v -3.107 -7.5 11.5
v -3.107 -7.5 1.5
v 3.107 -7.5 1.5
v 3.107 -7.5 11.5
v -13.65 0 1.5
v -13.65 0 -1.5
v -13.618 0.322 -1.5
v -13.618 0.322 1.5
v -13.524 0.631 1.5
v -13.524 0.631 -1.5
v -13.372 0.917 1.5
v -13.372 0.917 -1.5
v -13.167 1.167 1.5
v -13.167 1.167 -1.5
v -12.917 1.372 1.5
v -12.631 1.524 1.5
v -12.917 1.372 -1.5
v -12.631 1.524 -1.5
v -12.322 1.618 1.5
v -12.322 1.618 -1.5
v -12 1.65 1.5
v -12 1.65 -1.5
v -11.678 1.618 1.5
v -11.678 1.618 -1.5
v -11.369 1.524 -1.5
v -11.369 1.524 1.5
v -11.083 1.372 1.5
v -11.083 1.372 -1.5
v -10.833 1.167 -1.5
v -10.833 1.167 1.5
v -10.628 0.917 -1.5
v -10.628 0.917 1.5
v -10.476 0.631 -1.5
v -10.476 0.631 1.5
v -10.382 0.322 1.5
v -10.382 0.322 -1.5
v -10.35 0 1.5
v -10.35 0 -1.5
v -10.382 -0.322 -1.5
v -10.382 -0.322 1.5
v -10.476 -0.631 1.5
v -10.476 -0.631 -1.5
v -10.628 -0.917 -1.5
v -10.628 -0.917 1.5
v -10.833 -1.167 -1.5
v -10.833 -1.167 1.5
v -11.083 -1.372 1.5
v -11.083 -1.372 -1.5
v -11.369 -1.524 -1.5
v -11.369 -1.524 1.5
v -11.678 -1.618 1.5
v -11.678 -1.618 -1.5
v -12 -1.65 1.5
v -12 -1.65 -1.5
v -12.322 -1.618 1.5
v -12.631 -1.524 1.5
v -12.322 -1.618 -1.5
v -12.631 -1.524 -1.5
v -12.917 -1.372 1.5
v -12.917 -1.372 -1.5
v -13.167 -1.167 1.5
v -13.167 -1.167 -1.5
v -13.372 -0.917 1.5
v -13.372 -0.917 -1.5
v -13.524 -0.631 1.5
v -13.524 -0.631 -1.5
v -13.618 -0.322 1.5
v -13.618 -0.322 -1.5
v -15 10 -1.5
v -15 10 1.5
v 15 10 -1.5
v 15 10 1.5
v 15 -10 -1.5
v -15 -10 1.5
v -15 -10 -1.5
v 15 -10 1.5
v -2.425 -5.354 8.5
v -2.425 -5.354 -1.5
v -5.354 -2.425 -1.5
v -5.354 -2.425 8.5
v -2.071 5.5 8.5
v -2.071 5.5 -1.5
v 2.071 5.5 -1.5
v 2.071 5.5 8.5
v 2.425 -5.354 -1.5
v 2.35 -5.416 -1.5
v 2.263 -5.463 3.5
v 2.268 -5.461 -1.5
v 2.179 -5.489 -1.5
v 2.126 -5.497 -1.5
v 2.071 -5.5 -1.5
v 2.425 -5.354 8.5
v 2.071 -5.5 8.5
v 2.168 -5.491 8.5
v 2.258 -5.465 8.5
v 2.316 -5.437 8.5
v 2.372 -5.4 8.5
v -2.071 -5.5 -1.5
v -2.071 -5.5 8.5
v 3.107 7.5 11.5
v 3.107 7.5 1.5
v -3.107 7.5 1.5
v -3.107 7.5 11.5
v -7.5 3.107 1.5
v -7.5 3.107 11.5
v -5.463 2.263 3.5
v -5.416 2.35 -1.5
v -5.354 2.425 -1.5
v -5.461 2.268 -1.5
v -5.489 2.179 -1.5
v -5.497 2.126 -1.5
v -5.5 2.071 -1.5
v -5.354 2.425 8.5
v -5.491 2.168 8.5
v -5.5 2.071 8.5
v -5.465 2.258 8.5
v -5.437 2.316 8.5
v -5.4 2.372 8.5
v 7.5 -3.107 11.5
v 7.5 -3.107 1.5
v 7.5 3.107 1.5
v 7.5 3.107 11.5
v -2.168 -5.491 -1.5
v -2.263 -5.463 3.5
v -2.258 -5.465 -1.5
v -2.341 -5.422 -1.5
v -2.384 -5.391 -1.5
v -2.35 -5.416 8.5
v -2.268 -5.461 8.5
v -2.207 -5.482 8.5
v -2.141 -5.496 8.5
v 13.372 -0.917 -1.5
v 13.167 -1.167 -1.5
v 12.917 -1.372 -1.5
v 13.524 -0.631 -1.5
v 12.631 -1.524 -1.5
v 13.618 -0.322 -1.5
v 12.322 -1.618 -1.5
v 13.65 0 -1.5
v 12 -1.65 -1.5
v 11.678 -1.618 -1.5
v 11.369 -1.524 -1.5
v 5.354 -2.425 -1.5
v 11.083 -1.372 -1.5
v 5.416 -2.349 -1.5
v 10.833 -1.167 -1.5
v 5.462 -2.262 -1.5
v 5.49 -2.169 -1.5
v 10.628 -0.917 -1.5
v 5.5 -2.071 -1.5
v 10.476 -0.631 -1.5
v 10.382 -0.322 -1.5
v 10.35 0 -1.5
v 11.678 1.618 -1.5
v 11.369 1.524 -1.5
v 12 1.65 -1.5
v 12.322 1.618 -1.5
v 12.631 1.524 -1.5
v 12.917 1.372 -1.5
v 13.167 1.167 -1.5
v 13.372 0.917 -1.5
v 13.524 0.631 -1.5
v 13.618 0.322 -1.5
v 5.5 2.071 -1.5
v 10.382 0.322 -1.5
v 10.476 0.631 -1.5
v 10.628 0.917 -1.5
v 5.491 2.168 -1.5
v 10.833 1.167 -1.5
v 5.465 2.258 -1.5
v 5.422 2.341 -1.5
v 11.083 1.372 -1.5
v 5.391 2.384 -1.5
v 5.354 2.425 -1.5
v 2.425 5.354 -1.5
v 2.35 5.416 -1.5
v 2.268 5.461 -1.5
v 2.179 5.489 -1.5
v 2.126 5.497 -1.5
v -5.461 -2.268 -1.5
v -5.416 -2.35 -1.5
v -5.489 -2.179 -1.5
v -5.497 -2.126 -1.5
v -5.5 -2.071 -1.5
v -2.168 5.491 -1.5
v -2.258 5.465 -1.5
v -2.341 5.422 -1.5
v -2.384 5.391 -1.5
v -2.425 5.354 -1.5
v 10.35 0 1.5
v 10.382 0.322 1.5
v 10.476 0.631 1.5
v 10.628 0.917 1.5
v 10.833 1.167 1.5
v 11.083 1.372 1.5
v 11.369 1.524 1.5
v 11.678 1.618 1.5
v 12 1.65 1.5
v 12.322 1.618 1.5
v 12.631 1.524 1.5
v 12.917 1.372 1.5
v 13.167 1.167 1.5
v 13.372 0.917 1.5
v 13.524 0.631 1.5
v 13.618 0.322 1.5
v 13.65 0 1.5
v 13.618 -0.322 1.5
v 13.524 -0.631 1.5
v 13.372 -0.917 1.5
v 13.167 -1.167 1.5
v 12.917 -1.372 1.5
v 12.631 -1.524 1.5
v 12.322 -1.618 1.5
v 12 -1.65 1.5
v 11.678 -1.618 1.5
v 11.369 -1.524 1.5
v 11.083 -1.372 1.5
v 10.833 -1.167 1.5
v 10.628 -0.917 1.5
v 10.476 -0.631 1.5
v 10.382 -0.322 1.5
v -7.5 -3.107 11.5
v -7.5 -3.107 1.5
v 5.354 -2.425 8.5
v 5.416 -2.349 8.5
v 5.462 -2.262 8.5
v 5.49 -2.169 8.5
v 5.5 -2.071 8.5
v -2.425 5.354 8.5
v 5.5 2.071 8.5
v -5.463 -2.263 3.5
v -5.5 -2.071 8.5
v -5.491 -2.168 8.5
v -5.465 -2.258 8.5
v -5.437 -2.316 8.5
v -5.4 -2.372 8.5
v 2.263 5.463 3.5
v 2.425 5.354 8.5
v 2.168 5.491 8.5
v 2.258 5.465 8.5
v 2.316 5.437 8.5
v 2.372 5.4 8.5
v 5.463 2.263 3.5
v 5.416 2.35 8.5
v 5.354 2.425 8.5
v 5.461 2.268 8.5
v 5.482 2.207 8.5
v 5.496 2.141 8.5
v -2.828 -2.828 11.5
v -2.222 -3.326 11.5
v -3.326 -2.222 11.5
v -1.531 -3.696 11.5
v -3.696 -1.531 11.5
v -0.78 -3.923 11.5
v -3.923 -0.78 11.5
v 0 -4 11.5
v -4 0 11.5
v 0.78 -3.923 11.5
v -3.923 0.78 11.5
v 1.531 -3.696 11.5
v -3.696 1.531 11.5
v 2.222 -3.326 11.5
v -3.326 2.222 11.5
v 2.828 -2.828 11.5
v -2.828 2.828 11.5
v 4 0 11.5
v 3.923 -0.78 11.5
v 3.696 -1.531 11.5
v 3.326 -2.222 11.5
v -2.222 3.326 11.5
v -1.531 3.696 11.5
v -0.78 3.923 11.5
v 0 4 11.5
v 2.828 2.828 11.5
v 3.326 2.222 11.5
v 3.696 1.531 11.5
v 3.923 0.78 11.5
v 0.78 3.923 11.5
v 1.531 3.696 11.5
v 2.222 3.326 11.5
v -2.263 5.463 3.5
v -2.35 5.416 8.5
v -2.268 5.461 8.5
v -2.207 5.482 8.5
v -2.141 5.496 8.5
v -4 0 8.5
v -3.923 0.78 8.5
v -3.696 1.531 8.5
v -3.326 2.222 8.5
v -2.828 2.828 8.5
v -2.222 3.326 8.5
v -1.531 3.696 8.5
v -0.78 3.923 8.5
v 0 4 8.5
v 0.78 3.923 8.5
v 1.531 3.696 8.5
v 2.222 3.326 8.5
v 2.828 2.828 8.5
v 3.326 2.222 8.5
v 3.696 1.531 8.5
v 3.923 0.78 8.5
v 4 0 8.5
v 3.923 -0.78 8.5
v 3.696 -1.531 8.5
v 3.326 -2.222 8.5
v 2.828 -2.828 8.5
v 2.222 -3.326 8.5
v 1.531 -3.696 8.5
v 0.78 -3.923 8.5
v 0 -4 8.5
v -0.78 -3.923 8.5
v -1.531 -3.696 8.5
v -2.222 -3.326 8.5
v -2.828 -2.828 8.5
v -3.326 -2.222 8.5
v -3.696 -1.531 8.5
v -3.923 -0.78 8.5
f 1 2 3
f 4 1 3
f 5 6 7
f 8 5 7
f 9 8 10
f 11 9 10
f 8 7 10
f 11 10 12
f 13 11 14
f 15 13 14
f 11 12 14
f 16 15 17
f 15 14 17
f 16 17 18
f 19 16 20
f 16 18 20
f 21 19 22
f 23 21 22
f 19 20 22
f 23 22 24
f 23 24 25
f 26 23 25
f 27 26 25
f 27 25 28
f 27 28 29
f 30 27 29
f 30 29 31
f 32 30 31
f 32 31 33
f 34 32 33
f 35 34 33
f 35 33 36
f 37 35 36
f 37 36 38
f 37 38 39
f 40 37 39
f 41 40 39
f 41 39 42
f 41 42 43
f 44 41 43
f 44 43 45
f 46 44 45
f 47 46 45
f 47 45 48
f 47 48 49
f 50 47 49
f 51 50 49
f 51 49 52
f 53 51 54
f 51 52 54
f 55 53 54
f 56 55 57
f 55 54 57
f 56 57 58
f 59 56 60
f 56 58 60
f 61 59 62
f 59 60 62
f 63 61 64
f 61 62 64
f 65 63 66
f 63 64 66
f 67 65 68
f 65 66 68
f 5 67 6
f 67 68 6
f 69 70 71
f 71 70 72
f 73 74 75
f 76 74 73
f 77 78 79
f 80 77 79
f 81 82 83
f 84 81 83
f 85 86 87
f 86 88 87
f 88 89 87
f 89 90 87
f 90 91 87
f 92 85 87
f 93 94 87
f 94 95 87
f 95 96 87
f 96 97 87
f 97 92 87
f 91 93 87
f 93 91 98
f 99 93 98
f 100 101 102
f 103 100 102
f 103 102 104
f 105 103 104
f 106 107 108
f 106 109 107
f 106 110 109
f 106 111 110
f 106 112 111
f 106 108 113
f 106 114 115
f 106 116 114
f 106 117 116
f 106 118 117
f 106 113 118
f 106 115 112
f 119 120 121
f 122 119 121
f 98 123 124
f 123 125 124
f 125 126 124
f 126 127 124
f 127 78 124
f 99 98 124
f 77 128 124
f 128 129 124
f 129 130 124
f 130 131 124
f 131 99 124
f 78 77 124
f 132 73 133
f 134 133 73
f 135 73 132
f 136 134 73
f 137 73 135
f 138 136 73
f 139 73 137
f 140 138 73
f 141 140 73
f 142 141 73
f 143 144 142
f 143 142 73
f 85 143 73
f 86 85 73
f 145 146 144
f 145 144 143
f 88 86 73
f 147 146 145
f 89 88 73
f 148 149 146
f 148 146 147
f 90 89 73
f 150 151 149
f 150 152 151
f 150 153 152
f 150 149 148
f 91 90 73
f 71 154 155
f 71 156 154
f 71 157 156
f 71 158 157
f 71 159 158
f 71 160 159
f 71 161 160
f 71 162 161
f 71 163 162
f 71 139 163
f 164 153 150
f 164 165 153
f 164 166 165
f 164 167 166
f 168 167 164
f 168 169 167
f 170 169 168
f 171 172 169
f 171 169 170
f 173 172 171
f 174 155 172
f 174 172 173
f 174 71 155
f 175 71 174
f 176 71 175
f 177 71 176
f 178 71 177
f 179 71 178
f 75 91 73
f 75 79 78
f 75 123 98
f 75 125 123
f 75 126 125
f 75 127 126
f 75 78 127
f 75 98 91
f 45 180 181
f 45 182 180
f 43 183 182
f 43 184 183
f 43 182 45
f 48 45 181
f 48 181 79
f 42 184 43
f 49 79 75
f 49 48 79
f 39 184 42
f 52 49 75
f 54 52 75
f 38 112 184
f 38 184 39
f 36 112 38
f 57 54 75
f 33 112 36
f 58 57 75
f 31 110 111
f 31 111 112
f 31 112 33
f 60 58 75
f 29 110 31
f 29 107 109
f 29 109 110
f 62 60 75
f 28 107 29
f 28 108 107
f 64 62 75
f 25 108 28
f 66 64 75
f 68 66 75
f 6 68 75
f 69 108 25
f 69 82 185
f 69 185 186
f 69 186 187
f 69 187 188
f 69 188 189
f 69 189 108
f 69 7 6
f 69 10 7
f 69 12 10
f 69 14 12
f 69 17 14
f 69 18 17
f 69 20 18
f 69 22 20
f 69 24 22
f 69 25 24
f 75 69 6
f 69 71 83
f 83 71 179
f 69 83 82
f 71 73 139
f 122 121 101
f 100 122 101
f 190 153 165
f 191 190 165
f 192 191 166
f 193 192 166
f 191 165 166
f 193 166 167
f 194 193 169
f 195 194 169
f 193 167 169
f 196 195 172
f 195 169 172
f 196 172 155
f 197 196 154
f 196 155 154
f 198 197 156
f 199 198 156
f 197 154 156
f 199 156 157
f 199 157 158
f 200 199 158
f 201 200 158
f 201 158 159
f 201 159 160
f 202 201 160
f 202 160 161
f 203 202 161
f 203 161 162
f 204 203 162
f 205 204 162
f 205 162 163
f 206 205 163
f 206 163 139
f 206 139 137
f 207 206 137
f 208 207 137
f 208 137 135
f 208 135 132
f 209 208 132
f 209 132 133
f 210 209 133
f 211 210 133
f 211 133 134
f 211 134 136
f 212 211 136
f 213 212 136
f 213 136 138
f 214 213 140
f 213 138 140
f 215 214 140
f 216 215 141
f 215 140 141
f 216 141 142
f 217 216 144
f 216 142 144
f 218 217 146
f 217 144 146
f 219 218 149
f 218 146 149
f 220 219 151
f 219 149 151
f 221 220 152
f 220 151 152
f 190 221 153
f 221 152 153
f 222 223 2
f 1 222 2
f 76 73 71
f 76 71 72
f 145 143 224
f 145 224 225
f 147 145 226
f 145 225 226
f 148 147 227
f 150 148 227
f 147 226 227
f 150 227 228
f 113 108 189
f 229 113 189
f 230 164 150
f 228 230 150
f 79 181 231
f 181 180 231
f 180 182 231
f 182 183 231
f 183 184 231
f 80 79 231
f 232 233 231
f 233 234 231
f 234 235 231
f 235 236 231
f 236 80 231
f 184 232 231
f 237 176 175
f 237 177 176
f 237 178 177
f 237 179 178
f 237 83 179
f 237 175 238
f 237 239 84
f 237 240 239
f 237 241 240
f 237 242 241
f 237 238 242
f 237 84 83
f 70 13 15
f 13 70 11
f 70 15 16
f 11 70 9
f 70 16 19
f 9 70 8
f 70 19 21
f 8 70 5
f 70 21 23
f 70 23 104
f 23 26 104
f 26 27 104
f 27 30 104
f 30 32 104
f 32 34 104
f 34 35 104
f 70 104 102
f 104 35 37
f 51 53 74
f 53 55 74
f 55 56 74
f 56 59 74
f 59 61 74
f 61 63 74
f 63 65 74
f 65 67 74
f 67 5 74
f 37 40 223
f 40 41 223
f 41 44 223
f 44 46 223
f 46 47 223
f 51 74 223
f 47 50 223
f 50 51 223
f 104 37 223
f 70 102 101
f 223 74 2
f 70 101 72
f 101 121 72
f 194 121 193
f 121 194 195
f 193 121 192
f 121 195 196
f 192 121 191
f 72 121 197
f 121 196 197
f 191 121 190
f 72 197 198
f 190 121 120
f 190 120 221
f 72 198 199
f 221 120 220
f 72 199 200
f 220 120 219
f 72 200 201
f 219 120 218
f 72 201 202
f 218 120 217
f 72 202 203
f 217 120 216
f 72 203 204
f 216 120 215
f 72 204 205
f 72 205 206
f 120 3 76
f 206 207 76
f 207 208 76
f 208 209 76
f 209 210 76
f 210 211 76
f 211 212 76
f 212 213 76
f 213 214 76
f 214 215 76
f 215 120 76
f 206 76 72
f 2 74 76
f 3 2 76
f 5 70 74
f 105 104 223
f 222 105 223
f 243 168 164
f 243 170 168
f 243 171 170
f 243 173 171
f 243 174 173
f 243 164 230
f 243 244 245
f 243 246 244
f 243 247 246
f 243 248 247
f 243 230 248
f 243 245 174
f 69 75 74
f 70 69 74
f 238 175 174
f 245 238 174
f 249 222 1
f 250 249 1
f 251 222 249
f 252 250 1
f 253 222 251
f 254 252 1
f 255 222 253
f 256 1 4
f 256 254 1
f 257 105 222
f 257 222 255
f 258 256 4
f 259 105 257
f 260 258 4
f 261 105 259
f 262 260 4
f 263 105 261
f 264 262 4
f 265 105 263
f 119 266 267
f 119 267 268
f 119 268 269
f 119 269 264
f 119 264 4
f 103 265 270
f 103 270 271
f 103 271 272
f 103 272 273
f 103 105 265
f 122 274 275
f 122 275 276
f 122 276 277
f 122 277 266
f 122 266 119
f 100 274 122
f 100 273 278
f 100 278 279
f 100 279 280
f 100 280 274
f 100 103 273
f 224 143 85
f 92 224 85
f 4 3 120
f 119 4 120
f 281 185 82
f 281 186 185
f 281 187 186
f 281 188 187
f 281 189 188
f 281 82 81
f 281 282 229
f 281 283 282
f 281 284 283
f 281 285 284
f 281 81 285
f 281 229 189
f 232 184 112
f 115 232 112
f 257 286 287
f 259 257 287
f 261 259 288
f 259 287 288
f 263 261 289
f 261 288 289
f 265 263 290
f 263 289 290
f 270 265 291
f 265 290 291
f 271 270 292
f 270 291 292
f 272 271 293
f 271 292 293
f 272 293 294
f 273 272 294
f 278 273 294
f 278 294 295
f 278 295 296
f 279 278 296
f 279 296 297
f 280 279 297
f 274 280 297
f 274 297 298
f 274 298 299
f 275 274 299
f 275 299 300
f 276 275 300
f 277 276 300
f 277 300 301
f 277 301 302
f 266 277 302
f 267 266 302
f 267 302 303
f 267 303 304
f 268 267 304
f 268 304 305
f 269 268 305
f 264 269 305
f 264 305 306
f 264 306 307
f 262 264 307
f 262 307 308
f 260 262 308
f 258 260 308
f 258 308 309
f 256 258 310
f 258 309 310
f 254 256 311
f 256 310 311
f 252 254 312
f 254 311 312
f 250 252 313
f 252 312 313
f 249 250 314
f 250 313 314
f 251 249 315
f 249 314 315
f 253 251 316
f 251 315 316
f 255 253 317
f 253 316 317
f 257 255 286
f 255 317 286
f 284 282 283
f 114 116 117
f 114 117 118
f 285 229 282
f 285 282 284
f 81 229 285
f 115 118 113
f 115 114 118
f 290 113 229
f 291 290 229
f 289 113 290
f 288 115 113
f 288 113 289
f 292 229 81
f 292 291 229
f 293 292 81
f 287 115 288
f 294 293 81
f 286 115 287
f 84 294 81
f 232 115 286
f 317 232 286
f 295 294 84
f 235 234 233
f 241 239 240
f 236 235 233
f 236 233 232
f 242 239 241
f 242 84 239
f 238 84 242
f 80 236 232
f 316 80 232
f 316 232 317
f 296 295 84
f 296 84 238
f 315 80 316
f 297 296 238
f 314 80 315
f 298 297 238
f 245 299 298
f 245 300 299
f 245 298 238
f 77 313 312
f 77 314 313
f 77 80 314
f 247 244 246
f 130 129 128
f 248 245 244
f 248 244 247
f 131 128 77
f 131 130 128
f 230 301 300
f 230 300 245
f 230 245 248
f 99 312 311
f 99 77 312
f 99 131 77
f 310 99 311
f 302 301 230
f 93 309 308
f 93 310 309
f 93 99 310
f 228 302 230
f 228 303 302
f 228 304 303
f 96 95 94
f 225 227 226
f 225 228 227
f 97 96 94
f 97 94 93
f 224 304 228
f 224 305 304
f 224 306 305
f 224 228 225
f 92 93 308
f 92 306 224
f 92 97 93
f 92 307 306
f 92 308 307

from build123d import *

# Parameters (mm, degrees)
F0_W         = 30
F0_H         = 3
F1_DEPTH     = 10
F3_DEPTH     = 10
F5_DEPTH     = 10
F7_D         = 8
F8_T1_DEPTH  = 10.517766953
F9_R         = 0.5
F10_T1_DEPTH = 10.517766953
F11_T1_DEPTH = 10.517766953
F12_T1_DEPTH = 10.517766953
F13_T1_DEPTH = 10.517766953
F14_T1_DEPTH = 10.517766953
F15_T1_DEPTH = 10.517766953
F17_D        = 3.3


# Not quite as in the source:
# - a fillet or chamfer that OpenCascade refuses, or shapes differently, is made with other operations: its cross-section is extruded or revolved along the edge and cut away or added
# - a feature names something its author has since deleted; it is built from what else it names


with BuildPart() as f1:
    # F0 (on Front) → F1 (new body, symmetric)
    with BuildSketch(Plane.XZ):
        Rectangle(F0_W, F0_H)
    extrude(amount=F1_DEPTH, both=True)

    # F2 (on face) → F3 (join)
    with BuildSketch(Plane.XY.offset(1.5)):
        Polygon((-3.1066017178, -7.5), (3.1066017178, -7.5), (7.5, -3.1066017178), (7.5, 3.1066017178), (3.1066017178, 7.5), (-3.1066017178, 7.5), (-7.5, 3.1066017178), (-7.5, -3.1066017178), align=None)
    extrude(amount=F3_DEPTH)

    # F4 (on face) → F5 (cut)
    with BuildSketch(Plane(origin=(0, 0, -1.5), x_dir=(1, 0, 0), z_dir=(0, 0, -1))):
        Polygon((-2.2781745931, -5.5), (2.2781745931, -5.5), (5.5, -2.2781745931), (5.5, 2.2781745931), (2.2781745931, 5.5), (-2.2781745931, 5.5), (-5.5, 2.2781745931), (-5.5, -2.2781745931), align=None)
    extrude(amount=-F5_DEPTH, mode=Mode.SUBTRACT)

    # F7 (through all)
    with Locations(Plane.XY.offset(11.5)):
        with Locations((0, 0)):
            Hole(F7_D / 2)

    # F8: fillet of radius 0.5 on 1 edges, made by hand

    # F8_s2 → F8_t1 (join)
    with BuildSketch(Plane.XY.offset(-1.5)):
        with BuildLine():
            add(Edge.make_bspline(
                [(2.4246212025, -5.3535533906), (2.2781745931, -5.5), (2.0710678119, -5.5)],
                knots=[0, 0, 0, 1, 1, 1], degree=2, weights=[1, 1, 1]))
            Line((2.0710678119, -5.5), (2.2781745931, -5.5))
            Line((2.2781745931, -5.5), (2.4246212025, -5.3535533906))
        make_face()
    extrude(amount=F8_T1_DEPTH)

    # F9
    f9_edges = [f1.edges().sort_by_distance(p)[0] for p in [
        (5.5, -2.278175, 3.5),
    ]]
    fillet(f9_edges, radius=F9_R)

    # F10: fillet of radius 0.5 on 1 edges, made by hand

    # F10_s2 → F10_t1 (join)
    with BuildSketch(Plane.XY.offset(-1.5)):
        with BuildLine():
            add(Edge.make_bspline(
                [(-2.0710678119, -5.5), (-2.2781745931, -5.5), (-2.4246212025, -5.3535533906)],
                knots=[0, 0, 0, 1, 1, 1], degree=2, weights=[1, 1, 1]))
            Line((-2.4246212025, -5.3535533906), (-2.2781745931, -5.5))
            Line((-2.2781745931, -5.5), (-2.0710678119, -5.5))
        make_face()
    extrude(amount=F10_T1_DEPTH)

    # F11: fillet of radius 0.5 on 1 edges, made by hand

    # F11_s2 → F11_t1 (join)
    with BuildSketch(Plane.XY.offset(-1.5)):
        with BuildLine():
            add(Edge.make_bspline(
                [(-5.3535533906, -2.4246212025), (-5.5, -2.2781745931), (-5.5, -2.0710678119)],
                knots=[0, 0, 0, 1, 1, 1], degree=2, weights=[1, 1, 1]))
            Line((-5.5, -2.0710678119), (-5.5, -2.2781745931))
            Line((-5.5, -2.2781745931), (-5.3535533906, -2.4246212025))
        make_face()
    extrude(amount=F11_T1_DEPTH)

    # F12: fillet of radius 0.5 on 1 edges, made by hand

    # F12_s2 → F12_t1 (join)
    with BuildSketch(Plane.XY.offset(-1.5)):
        with BuildLine():
            add(Edge.make_bspline(
                [(-5.3535533906, 2.4246212025), (-5.5, 2.2781745931), (-5.5, 2.0710678119)],
                knots=[0, 0, 0, 1, 1, 1], degree=2, weights=[1, 1, 1]))
            Line((-5.5, 2.0710678119), (-5.5, 2.2781745931))
            Line((-5.5, 2.2781745931), (-5.3535533906, 2.4246212025))
        make_face()
    extrude(amount=F12_T1_DEPTH)

    # F13: fillet of radius 0.5 on 1 edges, made by hand

    # F13_s2 → F13_t1 (join)
    with BuildSketch(Plane.XY.offset(-1.5)):
        with BuildLine():
            add(Edge.make_bspline(
                [(5.5, 2.0710678119), (5.5, 2.2781745931), (5.3535533906, 2.4246212025)],
                knots=[0, 0, 0, 1, 1, 1], degree=2, weights=[1, 1, 1]))
            Line((5.3535533906, 2.4246212025), (5.5, 2.2781745931))
            Line((5.5, 2.2781745931), (5.5, 2.0710678119))
        make_face()
    extrude(amount=F13_T1_DEPTH)

    # F14: fillet of radius 0.5 on 1 edges, made by hand

    # F14_s2 → F14_t1 (join)
    with BuildSketch(Plane.XY.offset(-1.5)):
        with BuildLine():
            add(Edge.make_bspline(
                [(2.4246212025, 5.3535533906), (2.2781745931, 5.5), (2.0710678119, 5.5)],
                knots=[0, 0, 0, 1, 1, 1], degree=2, weights=[1, 1, 1]))
            Line((2.0710678119, 5.5), (2.2781745931, 5.5))
            Line((2.2781745931, 5.5), (2.4246212025, 5.3535533906))
        make_face()
    extrude(amount=F14_T1_DEPTH)

    # F15: fillet of radius 0.5 on 1 edges, made by hand

    # F15_s2 → F15_t1 (join)
    with BuildSketch(Plane.XY.offset(-1.5)):
        with BuildLine():
            add(Edge.make_bspline(
                [(-2.0710678119, 5.5), (-2.2781745931, 5.5), (-2.4246212025, 5.3535533906)],
                knots=[0, 0, 0, 1, 1, 1], degree=2, weights=[1, 1, 1]))
            Line((-2.4246212025, 5.3535533906), (-2.2781745931, 5.5))
            Line((-2.2781745931, 5.5), (-2.0710678119, 5.5))
        make_face()
    extrude(amount=F15_T1_DEPTH)

    # F17 (through all)
    with Locations(Plane.XY.offset(1.5)):
        with Locations((-12, 0), (12, 0)):
            Hole(F17_D / 2)


solid = f1.part
